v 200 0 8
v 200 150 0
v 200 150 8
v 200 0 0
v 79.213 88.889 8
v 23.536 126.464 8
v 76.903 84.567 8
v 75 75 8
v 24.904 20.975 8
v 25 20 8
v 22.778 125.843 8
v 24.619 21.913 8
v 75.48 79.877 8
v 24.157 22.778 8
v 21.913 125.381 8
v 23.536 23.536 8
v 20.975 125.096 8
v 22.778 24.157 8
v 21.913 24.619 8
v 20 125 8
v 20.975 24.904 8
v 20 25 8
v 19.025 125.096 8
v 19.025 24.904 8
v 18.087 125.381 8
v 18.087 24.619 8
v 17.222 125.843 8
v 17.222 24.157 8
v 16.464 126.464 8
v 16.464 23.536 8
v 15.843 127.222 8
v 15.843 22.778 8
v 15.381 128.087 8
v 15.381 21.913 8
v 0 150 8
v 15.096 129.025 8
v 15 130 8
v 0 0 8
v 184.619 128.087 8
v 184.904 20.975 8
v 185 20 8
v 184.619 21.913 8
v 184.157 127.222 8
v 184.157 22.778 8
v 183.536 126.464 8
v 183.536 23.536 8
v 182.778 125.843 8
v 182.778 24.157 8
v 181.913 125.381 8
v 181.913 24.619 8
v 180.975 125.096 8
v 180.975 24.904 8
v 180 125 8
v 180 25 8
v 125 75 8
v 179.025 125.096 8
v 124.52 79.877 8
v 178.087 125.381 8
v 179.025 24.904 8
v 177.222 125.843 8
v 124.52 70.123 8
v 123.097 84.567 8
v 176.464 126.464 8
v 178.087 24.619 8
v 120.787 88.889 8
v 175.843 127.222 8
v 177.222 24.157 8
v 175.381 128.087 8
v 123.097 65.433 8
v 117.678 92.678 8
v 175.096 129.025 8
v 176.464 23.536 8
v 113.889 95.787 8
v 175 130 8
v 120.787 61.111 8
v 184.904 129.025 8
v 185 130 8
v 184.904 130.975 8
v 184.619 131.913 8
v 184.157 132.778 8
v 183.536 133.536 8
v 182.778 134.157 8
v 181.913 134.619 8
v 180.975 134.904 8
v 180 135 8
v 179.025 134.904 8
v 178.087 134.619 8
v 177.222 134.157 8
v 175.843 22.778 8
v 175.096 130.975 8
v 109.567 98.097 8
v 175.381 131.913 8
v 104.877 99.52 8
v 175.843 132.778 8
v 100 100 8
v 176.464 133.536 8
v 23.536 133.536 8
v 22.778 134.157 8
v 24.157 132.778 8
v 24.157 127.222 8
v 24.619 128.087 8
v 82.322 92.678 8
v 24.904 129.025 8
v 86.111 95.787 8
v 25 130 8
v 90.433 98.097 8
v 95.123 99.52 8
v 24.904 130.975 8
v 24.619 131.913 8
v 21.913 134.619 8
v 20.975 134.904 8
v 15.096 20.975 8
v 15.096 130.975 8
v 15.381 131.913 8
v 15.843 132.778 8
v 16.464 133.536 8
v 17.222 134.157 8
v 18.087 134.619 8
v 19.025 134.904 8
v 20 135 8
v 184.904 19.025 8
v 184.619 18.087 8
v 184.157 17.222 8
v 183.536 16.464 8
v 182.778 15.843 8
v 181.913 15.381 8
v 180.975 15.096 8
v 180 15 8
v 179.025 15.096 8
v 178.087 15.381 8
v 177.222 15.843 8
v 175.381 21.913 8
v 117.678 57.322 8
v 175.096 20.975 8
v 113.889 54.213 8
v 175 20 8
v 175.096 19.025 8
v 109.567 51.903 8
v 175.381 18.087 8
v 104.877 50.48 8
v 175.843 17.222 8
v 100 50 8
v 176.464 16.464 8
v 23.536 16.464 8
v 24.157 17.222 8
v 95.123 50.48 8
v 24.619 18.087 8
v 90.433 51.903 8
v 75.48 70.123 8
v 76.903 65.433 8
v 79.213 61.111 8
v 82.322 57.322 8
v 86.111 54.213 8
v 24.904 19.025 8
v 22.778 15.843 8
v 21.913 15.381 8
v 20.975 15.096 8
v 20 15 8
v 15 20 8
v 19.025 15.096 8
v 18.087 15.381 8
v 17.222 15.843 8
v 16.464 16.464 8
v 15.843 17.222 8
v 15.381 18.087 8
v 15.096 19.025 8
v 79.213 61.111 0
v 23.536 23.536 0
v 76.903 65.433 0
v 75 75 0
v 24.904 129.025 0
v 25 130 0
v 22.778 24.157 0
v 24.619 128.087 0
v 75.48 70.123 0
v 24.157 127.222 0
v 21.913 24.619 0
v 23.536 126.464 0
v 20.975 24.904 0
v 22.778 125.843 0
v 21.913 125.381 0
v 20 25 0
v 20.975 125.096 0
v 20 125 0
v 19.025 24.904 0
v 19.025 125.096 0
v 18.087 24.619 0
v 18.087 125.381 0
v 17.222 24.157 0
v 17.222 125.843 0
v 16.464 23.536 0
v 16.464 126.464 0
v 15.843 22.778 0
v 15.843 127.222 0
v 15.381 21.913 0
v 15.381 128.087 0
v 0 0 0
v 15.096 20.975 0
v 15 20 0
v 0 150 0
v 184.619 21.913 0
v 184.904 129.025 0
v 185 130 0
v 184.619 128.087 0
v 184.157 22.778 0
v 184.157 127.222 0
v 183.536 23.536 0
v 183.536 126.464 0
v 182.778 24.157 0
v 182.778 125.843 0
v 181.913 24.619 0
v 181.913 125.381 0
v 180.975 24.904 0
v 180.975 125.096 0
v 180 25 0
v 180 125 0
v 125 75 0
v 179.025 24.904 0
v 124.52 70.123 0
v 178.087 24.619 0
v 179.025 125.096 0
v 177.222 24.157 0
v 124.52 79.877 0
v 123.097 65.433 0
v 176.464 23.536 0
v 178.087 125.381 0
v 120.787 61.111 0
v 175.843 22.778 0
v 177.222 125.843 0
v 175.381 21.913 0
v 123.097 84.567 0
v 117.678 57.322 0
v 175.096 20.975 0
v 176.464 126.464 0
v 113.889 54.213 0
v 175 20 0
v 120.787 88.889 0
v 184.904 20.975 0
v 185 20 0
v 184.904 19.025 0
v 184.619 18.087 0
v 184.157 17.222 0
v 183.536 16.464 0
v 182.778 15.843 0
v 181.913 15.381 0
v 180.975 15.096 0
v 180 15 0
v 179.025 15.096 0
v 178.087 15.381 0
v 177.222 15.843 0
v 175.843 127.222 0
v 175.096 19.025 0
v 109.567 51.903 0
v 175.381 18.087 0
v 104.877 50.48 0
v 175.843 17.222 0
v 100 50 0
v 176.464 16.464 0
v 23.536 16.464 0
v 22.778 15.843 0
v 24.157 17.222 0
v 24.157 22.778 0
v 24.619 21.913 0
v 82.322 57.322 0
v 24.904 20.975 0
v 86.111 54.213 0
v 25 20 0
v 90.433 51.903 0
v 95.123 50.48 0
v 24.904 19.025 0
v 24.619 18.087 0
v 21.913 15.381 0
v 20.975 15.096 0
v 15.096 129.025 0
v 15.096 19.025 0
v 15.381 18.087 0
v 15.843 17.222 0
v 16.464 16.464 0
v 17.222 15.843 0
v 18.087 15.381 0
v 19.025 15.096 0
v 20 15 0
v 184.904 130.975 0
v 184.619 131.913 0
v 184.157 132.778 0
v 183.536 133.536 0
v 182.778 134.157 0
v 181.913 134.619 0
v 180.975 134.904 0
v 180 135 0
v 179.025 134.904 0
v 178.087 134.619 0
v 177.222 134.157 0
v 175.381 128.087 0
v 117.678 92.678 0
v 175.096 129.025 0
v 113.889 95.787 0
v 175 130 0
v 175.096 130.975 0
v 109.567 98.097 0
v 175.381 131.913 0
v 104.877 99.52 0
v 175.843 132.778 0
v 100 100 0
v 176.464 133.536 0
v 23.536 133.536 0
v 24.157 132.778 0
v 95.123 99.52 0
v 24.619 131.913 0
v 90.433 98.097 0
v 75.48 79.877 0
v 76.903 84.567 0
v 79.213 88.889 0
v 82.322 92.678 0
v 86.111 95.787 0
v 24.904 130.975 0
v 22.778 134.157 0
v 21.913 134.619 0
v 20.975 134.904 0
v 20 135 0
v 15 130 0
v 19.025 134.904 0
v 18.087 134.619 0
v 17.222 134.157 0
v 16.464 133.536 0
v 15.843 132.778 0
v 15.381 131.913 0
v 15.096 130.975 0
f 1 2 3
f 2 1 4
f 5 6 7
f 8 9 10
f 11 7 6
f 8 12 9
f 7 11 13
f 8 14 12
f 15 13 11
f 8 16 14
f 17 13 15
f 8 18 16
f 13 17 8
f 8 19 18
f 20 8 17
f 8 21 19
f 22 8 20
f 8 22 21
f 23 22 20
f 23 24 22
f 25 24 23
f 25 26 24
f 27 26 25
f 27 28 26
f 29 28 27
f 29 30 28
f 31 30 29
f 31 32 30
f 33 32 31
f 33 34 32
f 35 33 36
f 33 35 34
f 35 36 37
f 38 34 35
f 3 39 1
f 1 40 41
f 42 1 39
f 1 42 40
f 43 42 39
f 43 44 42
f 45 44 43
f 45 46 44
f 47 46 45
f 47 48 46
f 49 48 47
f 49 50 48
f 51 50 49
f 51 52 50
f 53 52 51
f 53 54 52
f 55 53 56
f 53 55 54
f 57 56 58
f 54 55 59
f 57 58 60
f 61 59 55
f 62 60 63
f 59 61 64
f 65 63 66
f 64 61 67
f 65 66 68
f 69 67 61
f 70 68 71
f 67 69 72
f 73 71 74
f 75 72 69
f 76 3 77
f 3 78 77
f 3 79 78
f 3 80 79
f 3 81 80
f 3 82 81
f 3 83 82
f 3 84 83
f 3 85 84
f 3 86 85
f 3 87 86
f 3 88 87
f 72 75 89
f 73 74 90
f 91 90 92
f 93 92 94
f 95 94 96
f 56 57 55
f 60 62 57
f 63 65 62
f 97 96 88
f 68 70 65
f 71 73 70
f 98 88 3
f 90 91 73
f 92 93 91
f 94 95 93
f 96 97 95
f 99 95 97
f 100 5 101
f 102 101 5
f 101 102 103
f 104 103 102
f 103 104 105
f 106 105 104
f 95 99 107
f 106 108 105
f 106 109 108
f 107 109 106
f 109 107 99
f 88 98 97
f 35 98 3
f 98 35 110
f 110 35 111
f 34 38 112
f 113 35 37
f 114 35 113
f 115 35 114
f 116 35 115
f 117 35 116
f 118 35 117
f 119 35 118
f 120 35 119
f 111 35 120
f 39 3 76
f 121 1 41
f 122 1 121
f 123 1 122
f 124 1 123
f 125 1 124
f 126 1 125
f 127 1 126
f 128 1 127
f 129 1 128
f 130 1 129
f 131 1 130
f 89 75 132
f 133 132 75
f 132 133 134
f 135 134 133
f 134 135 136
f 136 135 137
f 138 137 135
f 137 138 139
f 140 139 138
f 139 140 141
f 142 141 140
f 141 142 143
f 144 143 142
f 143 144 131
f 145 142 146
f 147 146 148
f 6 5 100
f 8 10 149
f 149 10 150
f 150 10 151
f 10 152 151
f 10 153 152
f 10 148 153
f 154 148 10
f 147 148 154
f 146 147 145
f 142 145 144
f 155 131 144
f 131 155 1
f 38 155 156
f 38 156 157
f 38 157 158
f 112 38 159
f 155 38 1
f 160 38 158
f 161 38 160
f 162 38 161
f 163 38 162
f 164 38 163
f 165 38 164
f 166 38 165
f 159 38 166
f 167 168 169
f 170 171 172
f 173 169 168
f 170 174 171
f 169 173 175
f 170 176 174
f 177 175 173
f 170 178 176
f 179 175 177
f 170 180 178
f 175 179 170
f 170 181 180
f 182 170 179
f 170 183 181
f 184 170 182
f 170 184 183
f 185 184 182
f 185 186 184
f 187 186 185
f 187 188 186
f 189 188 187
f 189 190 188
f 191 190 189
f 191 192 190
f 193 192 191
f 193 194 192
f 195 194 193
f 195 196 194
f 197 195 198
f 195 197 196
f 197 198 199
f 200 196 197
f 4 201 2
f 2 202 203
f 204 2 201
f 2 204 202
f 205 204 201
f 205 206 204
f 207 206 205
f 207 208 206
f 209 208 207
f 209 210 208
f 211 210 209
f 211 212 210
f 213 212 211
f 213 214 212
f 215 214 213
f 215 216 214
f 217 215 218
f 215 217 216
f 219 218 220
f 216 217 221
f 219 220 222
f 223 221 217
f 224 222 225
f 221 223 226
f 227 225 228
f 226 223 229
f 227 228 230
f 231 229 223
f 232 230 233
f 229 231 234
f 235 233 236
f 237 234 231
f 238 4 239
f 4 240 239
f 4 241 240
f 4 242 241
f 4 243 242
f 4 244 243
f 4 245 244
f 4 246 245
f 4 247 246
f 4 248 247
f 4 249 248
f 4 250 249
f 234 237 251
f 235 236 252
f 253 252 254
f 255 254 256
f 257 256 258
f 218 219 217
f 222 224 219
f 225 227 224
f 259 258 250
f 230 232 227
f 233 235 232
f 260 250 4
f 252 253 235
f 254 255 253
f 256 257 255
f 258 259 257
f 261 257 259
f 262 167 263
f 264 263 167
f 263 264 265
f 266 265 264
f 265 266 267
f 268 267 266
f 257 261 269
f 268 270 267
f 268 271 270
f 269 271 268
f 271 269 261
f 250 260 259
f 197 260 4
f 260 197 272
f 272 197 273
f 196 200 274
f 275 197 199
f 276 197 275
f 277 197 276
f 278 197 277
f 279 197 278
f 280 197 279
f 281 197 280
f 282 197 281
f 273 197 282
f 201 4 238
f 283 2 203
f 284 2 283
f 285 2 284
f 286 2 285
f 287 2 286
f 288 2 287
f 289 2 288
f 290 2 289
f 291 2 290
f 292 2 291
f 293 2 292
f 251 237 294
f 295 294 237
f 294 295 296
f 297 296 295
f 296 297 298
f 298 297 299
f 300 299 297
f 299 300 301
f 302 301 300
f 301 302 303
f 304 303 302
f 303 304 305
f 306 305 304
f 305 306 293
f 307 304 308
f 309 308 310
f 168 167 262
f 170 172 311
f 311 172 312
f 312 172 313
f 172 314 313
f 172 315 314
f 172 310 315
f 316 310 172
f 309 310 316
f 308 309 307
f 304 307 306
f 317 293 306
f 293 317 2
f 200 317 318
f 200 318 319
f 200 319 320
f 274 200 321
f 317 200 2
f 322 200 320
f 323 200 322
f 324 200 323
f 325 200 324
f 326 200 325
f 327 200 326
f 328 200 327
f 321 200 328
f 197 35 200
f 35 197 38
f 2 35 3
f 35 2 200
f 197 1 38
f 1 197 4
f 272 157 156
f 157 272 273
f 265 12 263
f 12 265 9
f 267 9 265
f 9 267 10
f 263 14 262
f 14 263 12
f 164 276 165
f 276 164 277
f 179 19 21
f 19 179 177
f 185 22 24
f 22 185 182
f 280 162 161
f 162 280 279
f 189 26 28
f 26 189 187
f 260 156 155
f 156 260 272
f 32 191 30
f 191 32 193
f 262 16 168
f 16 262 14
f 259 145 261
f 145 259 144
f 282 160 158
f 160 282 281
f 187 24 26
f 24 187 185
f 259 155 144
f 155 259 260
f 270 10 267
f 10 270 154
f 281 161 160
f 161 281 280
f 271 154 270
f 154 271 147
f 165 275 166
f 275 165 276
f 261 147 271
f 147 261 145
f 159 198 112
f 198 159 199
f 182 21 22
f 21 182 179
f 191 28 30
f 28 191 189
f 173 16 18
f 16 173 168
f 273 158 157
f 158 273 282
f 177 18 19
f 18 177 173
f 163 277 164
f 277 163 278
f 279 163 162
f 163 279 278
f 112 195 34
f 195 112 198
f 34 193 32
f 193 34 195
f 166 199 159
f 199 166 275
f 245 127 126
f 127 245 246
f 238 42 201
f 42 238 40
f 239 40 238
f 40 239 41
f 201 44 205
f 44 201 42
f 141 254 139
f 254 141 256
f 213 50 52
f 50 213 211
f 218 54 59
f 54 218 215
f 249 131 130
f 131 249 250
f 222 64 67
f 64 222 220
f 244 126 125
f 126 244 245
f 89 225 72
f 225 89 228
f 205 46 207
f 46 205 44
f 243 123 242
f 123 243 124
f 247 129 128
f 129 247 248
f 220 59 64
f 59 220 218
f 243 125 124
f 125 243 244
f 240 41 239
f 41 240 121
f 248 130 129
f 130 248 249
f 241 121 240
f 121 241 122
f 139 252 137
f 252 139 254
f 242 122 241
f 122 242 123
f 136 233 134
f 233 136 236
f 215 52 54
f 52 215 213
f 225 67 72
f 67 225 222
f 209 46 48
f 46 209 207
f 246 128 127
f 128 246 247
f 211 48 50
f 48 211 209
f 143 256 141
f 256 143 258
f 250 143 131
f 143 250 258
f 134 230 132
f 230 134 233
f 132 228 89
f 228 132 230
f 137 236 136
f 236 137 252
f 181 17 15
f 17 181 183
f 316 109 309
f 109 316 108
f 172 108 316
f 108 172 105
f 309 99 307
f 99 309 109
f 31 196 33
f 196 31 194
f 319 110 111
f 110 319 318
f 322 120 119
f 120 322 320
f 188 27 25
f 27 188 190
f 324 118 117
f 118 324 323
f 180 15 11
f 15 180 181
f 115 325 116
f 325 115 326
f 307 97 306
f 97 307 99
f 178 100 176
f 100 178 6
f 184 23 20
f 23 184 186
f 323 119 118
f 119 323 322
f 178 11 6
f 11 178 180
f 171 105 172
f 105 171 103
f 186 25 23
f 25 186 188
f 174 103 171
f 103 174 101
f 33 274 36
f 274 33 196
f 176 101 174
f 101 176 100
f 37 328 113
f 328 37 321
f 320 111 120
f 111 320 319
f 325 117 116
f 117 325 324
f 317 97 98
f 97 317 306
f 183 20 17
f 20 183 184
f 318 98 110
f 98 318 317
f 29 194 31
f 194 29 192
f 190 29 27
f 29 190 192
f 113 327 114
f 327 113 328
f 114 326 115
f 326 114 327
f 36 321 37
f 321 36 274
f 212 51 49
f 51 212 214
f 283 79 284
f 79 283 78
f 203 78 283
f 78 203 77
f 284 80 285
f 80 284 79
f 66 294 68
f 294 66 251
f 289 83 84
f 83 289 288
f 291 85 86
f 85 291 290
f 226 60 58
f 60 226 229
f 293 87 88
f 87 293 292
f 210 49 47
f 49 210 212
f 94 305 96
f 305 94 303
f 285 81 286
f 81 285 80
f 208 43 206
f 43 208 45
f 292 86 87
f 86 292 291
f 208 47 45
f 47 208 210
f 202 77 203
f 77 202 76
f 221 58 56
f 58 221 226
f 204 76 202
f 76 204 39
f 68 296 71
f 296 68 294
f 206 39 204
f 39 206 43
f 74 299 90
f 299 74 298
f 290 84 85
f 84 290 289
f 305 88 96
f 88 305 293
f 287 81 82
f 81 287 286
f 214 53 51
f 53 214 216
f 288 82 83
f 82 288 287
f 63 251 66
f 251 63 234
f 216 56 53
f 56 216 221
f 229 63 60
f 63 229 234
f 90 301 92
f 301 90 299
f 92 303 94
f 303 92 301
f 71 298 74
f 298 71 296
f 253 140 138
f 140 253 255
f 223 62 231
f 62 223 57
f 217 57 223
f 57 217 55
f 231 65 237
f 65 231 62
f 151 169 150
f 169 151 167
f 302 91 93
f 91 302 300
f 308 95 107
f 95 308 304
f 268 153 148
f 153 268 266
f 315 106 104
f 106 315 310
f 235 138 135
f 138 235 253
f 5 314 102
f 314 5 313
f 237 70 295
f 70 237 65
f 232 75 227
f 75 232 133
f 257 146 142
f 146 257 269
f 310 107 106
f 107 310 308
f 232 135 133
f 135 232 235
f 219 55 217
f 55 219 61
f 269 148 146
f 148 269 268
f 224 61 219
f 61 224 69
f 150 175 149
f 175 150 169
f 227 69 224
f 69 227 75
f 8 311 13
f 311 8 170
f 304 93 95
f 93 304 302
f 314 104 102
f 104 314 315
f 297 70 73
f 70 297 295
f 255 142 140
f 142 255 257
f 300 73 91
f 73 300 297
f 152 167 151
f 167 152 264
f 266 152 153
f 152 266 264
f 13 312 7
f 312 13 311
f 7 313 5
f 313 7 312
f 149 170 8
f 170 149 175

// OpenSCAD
$fn = 32;

// ----------------------------------------------------------------------
// Big plate: 200-250 mm adapter plate
// ----------------------------------------------------------------------

// --- parameters (mm) ---
plate_l = 200;            // plate length, X
plate_w = 150;            // plate width, Y
plate_t = 8;              // plate thickness, Z
corner_d = 10;            // corner hole diameter
corner_in = 20;           // corner hole inset from the edges
bore_d = 50;              // central bore

difference() {
  cube([plate_l, plate_w, plate_t]);
  translate([corner_in, corner_in, -1]) cylinder(h = plate_t + 2, d = corner_d);
  translate([plate_l - corner_in, corner_in, -1]) cylinder(h = plate_t + 2, d = corner_d);
  translate([corner_in, plate_w - corner_in, -1]) cylinder(h = plate_t + 2, d = corner_d);
  translate([plate_l - corner_in, plate_w - corner_in, -1]) cylinder(h = plate_t + 2, d = corner_d);
  translate([plate_l / 2, plate_w / 2, -1]) cylinder(h = plate_t + 2, d = bore_d);
}
